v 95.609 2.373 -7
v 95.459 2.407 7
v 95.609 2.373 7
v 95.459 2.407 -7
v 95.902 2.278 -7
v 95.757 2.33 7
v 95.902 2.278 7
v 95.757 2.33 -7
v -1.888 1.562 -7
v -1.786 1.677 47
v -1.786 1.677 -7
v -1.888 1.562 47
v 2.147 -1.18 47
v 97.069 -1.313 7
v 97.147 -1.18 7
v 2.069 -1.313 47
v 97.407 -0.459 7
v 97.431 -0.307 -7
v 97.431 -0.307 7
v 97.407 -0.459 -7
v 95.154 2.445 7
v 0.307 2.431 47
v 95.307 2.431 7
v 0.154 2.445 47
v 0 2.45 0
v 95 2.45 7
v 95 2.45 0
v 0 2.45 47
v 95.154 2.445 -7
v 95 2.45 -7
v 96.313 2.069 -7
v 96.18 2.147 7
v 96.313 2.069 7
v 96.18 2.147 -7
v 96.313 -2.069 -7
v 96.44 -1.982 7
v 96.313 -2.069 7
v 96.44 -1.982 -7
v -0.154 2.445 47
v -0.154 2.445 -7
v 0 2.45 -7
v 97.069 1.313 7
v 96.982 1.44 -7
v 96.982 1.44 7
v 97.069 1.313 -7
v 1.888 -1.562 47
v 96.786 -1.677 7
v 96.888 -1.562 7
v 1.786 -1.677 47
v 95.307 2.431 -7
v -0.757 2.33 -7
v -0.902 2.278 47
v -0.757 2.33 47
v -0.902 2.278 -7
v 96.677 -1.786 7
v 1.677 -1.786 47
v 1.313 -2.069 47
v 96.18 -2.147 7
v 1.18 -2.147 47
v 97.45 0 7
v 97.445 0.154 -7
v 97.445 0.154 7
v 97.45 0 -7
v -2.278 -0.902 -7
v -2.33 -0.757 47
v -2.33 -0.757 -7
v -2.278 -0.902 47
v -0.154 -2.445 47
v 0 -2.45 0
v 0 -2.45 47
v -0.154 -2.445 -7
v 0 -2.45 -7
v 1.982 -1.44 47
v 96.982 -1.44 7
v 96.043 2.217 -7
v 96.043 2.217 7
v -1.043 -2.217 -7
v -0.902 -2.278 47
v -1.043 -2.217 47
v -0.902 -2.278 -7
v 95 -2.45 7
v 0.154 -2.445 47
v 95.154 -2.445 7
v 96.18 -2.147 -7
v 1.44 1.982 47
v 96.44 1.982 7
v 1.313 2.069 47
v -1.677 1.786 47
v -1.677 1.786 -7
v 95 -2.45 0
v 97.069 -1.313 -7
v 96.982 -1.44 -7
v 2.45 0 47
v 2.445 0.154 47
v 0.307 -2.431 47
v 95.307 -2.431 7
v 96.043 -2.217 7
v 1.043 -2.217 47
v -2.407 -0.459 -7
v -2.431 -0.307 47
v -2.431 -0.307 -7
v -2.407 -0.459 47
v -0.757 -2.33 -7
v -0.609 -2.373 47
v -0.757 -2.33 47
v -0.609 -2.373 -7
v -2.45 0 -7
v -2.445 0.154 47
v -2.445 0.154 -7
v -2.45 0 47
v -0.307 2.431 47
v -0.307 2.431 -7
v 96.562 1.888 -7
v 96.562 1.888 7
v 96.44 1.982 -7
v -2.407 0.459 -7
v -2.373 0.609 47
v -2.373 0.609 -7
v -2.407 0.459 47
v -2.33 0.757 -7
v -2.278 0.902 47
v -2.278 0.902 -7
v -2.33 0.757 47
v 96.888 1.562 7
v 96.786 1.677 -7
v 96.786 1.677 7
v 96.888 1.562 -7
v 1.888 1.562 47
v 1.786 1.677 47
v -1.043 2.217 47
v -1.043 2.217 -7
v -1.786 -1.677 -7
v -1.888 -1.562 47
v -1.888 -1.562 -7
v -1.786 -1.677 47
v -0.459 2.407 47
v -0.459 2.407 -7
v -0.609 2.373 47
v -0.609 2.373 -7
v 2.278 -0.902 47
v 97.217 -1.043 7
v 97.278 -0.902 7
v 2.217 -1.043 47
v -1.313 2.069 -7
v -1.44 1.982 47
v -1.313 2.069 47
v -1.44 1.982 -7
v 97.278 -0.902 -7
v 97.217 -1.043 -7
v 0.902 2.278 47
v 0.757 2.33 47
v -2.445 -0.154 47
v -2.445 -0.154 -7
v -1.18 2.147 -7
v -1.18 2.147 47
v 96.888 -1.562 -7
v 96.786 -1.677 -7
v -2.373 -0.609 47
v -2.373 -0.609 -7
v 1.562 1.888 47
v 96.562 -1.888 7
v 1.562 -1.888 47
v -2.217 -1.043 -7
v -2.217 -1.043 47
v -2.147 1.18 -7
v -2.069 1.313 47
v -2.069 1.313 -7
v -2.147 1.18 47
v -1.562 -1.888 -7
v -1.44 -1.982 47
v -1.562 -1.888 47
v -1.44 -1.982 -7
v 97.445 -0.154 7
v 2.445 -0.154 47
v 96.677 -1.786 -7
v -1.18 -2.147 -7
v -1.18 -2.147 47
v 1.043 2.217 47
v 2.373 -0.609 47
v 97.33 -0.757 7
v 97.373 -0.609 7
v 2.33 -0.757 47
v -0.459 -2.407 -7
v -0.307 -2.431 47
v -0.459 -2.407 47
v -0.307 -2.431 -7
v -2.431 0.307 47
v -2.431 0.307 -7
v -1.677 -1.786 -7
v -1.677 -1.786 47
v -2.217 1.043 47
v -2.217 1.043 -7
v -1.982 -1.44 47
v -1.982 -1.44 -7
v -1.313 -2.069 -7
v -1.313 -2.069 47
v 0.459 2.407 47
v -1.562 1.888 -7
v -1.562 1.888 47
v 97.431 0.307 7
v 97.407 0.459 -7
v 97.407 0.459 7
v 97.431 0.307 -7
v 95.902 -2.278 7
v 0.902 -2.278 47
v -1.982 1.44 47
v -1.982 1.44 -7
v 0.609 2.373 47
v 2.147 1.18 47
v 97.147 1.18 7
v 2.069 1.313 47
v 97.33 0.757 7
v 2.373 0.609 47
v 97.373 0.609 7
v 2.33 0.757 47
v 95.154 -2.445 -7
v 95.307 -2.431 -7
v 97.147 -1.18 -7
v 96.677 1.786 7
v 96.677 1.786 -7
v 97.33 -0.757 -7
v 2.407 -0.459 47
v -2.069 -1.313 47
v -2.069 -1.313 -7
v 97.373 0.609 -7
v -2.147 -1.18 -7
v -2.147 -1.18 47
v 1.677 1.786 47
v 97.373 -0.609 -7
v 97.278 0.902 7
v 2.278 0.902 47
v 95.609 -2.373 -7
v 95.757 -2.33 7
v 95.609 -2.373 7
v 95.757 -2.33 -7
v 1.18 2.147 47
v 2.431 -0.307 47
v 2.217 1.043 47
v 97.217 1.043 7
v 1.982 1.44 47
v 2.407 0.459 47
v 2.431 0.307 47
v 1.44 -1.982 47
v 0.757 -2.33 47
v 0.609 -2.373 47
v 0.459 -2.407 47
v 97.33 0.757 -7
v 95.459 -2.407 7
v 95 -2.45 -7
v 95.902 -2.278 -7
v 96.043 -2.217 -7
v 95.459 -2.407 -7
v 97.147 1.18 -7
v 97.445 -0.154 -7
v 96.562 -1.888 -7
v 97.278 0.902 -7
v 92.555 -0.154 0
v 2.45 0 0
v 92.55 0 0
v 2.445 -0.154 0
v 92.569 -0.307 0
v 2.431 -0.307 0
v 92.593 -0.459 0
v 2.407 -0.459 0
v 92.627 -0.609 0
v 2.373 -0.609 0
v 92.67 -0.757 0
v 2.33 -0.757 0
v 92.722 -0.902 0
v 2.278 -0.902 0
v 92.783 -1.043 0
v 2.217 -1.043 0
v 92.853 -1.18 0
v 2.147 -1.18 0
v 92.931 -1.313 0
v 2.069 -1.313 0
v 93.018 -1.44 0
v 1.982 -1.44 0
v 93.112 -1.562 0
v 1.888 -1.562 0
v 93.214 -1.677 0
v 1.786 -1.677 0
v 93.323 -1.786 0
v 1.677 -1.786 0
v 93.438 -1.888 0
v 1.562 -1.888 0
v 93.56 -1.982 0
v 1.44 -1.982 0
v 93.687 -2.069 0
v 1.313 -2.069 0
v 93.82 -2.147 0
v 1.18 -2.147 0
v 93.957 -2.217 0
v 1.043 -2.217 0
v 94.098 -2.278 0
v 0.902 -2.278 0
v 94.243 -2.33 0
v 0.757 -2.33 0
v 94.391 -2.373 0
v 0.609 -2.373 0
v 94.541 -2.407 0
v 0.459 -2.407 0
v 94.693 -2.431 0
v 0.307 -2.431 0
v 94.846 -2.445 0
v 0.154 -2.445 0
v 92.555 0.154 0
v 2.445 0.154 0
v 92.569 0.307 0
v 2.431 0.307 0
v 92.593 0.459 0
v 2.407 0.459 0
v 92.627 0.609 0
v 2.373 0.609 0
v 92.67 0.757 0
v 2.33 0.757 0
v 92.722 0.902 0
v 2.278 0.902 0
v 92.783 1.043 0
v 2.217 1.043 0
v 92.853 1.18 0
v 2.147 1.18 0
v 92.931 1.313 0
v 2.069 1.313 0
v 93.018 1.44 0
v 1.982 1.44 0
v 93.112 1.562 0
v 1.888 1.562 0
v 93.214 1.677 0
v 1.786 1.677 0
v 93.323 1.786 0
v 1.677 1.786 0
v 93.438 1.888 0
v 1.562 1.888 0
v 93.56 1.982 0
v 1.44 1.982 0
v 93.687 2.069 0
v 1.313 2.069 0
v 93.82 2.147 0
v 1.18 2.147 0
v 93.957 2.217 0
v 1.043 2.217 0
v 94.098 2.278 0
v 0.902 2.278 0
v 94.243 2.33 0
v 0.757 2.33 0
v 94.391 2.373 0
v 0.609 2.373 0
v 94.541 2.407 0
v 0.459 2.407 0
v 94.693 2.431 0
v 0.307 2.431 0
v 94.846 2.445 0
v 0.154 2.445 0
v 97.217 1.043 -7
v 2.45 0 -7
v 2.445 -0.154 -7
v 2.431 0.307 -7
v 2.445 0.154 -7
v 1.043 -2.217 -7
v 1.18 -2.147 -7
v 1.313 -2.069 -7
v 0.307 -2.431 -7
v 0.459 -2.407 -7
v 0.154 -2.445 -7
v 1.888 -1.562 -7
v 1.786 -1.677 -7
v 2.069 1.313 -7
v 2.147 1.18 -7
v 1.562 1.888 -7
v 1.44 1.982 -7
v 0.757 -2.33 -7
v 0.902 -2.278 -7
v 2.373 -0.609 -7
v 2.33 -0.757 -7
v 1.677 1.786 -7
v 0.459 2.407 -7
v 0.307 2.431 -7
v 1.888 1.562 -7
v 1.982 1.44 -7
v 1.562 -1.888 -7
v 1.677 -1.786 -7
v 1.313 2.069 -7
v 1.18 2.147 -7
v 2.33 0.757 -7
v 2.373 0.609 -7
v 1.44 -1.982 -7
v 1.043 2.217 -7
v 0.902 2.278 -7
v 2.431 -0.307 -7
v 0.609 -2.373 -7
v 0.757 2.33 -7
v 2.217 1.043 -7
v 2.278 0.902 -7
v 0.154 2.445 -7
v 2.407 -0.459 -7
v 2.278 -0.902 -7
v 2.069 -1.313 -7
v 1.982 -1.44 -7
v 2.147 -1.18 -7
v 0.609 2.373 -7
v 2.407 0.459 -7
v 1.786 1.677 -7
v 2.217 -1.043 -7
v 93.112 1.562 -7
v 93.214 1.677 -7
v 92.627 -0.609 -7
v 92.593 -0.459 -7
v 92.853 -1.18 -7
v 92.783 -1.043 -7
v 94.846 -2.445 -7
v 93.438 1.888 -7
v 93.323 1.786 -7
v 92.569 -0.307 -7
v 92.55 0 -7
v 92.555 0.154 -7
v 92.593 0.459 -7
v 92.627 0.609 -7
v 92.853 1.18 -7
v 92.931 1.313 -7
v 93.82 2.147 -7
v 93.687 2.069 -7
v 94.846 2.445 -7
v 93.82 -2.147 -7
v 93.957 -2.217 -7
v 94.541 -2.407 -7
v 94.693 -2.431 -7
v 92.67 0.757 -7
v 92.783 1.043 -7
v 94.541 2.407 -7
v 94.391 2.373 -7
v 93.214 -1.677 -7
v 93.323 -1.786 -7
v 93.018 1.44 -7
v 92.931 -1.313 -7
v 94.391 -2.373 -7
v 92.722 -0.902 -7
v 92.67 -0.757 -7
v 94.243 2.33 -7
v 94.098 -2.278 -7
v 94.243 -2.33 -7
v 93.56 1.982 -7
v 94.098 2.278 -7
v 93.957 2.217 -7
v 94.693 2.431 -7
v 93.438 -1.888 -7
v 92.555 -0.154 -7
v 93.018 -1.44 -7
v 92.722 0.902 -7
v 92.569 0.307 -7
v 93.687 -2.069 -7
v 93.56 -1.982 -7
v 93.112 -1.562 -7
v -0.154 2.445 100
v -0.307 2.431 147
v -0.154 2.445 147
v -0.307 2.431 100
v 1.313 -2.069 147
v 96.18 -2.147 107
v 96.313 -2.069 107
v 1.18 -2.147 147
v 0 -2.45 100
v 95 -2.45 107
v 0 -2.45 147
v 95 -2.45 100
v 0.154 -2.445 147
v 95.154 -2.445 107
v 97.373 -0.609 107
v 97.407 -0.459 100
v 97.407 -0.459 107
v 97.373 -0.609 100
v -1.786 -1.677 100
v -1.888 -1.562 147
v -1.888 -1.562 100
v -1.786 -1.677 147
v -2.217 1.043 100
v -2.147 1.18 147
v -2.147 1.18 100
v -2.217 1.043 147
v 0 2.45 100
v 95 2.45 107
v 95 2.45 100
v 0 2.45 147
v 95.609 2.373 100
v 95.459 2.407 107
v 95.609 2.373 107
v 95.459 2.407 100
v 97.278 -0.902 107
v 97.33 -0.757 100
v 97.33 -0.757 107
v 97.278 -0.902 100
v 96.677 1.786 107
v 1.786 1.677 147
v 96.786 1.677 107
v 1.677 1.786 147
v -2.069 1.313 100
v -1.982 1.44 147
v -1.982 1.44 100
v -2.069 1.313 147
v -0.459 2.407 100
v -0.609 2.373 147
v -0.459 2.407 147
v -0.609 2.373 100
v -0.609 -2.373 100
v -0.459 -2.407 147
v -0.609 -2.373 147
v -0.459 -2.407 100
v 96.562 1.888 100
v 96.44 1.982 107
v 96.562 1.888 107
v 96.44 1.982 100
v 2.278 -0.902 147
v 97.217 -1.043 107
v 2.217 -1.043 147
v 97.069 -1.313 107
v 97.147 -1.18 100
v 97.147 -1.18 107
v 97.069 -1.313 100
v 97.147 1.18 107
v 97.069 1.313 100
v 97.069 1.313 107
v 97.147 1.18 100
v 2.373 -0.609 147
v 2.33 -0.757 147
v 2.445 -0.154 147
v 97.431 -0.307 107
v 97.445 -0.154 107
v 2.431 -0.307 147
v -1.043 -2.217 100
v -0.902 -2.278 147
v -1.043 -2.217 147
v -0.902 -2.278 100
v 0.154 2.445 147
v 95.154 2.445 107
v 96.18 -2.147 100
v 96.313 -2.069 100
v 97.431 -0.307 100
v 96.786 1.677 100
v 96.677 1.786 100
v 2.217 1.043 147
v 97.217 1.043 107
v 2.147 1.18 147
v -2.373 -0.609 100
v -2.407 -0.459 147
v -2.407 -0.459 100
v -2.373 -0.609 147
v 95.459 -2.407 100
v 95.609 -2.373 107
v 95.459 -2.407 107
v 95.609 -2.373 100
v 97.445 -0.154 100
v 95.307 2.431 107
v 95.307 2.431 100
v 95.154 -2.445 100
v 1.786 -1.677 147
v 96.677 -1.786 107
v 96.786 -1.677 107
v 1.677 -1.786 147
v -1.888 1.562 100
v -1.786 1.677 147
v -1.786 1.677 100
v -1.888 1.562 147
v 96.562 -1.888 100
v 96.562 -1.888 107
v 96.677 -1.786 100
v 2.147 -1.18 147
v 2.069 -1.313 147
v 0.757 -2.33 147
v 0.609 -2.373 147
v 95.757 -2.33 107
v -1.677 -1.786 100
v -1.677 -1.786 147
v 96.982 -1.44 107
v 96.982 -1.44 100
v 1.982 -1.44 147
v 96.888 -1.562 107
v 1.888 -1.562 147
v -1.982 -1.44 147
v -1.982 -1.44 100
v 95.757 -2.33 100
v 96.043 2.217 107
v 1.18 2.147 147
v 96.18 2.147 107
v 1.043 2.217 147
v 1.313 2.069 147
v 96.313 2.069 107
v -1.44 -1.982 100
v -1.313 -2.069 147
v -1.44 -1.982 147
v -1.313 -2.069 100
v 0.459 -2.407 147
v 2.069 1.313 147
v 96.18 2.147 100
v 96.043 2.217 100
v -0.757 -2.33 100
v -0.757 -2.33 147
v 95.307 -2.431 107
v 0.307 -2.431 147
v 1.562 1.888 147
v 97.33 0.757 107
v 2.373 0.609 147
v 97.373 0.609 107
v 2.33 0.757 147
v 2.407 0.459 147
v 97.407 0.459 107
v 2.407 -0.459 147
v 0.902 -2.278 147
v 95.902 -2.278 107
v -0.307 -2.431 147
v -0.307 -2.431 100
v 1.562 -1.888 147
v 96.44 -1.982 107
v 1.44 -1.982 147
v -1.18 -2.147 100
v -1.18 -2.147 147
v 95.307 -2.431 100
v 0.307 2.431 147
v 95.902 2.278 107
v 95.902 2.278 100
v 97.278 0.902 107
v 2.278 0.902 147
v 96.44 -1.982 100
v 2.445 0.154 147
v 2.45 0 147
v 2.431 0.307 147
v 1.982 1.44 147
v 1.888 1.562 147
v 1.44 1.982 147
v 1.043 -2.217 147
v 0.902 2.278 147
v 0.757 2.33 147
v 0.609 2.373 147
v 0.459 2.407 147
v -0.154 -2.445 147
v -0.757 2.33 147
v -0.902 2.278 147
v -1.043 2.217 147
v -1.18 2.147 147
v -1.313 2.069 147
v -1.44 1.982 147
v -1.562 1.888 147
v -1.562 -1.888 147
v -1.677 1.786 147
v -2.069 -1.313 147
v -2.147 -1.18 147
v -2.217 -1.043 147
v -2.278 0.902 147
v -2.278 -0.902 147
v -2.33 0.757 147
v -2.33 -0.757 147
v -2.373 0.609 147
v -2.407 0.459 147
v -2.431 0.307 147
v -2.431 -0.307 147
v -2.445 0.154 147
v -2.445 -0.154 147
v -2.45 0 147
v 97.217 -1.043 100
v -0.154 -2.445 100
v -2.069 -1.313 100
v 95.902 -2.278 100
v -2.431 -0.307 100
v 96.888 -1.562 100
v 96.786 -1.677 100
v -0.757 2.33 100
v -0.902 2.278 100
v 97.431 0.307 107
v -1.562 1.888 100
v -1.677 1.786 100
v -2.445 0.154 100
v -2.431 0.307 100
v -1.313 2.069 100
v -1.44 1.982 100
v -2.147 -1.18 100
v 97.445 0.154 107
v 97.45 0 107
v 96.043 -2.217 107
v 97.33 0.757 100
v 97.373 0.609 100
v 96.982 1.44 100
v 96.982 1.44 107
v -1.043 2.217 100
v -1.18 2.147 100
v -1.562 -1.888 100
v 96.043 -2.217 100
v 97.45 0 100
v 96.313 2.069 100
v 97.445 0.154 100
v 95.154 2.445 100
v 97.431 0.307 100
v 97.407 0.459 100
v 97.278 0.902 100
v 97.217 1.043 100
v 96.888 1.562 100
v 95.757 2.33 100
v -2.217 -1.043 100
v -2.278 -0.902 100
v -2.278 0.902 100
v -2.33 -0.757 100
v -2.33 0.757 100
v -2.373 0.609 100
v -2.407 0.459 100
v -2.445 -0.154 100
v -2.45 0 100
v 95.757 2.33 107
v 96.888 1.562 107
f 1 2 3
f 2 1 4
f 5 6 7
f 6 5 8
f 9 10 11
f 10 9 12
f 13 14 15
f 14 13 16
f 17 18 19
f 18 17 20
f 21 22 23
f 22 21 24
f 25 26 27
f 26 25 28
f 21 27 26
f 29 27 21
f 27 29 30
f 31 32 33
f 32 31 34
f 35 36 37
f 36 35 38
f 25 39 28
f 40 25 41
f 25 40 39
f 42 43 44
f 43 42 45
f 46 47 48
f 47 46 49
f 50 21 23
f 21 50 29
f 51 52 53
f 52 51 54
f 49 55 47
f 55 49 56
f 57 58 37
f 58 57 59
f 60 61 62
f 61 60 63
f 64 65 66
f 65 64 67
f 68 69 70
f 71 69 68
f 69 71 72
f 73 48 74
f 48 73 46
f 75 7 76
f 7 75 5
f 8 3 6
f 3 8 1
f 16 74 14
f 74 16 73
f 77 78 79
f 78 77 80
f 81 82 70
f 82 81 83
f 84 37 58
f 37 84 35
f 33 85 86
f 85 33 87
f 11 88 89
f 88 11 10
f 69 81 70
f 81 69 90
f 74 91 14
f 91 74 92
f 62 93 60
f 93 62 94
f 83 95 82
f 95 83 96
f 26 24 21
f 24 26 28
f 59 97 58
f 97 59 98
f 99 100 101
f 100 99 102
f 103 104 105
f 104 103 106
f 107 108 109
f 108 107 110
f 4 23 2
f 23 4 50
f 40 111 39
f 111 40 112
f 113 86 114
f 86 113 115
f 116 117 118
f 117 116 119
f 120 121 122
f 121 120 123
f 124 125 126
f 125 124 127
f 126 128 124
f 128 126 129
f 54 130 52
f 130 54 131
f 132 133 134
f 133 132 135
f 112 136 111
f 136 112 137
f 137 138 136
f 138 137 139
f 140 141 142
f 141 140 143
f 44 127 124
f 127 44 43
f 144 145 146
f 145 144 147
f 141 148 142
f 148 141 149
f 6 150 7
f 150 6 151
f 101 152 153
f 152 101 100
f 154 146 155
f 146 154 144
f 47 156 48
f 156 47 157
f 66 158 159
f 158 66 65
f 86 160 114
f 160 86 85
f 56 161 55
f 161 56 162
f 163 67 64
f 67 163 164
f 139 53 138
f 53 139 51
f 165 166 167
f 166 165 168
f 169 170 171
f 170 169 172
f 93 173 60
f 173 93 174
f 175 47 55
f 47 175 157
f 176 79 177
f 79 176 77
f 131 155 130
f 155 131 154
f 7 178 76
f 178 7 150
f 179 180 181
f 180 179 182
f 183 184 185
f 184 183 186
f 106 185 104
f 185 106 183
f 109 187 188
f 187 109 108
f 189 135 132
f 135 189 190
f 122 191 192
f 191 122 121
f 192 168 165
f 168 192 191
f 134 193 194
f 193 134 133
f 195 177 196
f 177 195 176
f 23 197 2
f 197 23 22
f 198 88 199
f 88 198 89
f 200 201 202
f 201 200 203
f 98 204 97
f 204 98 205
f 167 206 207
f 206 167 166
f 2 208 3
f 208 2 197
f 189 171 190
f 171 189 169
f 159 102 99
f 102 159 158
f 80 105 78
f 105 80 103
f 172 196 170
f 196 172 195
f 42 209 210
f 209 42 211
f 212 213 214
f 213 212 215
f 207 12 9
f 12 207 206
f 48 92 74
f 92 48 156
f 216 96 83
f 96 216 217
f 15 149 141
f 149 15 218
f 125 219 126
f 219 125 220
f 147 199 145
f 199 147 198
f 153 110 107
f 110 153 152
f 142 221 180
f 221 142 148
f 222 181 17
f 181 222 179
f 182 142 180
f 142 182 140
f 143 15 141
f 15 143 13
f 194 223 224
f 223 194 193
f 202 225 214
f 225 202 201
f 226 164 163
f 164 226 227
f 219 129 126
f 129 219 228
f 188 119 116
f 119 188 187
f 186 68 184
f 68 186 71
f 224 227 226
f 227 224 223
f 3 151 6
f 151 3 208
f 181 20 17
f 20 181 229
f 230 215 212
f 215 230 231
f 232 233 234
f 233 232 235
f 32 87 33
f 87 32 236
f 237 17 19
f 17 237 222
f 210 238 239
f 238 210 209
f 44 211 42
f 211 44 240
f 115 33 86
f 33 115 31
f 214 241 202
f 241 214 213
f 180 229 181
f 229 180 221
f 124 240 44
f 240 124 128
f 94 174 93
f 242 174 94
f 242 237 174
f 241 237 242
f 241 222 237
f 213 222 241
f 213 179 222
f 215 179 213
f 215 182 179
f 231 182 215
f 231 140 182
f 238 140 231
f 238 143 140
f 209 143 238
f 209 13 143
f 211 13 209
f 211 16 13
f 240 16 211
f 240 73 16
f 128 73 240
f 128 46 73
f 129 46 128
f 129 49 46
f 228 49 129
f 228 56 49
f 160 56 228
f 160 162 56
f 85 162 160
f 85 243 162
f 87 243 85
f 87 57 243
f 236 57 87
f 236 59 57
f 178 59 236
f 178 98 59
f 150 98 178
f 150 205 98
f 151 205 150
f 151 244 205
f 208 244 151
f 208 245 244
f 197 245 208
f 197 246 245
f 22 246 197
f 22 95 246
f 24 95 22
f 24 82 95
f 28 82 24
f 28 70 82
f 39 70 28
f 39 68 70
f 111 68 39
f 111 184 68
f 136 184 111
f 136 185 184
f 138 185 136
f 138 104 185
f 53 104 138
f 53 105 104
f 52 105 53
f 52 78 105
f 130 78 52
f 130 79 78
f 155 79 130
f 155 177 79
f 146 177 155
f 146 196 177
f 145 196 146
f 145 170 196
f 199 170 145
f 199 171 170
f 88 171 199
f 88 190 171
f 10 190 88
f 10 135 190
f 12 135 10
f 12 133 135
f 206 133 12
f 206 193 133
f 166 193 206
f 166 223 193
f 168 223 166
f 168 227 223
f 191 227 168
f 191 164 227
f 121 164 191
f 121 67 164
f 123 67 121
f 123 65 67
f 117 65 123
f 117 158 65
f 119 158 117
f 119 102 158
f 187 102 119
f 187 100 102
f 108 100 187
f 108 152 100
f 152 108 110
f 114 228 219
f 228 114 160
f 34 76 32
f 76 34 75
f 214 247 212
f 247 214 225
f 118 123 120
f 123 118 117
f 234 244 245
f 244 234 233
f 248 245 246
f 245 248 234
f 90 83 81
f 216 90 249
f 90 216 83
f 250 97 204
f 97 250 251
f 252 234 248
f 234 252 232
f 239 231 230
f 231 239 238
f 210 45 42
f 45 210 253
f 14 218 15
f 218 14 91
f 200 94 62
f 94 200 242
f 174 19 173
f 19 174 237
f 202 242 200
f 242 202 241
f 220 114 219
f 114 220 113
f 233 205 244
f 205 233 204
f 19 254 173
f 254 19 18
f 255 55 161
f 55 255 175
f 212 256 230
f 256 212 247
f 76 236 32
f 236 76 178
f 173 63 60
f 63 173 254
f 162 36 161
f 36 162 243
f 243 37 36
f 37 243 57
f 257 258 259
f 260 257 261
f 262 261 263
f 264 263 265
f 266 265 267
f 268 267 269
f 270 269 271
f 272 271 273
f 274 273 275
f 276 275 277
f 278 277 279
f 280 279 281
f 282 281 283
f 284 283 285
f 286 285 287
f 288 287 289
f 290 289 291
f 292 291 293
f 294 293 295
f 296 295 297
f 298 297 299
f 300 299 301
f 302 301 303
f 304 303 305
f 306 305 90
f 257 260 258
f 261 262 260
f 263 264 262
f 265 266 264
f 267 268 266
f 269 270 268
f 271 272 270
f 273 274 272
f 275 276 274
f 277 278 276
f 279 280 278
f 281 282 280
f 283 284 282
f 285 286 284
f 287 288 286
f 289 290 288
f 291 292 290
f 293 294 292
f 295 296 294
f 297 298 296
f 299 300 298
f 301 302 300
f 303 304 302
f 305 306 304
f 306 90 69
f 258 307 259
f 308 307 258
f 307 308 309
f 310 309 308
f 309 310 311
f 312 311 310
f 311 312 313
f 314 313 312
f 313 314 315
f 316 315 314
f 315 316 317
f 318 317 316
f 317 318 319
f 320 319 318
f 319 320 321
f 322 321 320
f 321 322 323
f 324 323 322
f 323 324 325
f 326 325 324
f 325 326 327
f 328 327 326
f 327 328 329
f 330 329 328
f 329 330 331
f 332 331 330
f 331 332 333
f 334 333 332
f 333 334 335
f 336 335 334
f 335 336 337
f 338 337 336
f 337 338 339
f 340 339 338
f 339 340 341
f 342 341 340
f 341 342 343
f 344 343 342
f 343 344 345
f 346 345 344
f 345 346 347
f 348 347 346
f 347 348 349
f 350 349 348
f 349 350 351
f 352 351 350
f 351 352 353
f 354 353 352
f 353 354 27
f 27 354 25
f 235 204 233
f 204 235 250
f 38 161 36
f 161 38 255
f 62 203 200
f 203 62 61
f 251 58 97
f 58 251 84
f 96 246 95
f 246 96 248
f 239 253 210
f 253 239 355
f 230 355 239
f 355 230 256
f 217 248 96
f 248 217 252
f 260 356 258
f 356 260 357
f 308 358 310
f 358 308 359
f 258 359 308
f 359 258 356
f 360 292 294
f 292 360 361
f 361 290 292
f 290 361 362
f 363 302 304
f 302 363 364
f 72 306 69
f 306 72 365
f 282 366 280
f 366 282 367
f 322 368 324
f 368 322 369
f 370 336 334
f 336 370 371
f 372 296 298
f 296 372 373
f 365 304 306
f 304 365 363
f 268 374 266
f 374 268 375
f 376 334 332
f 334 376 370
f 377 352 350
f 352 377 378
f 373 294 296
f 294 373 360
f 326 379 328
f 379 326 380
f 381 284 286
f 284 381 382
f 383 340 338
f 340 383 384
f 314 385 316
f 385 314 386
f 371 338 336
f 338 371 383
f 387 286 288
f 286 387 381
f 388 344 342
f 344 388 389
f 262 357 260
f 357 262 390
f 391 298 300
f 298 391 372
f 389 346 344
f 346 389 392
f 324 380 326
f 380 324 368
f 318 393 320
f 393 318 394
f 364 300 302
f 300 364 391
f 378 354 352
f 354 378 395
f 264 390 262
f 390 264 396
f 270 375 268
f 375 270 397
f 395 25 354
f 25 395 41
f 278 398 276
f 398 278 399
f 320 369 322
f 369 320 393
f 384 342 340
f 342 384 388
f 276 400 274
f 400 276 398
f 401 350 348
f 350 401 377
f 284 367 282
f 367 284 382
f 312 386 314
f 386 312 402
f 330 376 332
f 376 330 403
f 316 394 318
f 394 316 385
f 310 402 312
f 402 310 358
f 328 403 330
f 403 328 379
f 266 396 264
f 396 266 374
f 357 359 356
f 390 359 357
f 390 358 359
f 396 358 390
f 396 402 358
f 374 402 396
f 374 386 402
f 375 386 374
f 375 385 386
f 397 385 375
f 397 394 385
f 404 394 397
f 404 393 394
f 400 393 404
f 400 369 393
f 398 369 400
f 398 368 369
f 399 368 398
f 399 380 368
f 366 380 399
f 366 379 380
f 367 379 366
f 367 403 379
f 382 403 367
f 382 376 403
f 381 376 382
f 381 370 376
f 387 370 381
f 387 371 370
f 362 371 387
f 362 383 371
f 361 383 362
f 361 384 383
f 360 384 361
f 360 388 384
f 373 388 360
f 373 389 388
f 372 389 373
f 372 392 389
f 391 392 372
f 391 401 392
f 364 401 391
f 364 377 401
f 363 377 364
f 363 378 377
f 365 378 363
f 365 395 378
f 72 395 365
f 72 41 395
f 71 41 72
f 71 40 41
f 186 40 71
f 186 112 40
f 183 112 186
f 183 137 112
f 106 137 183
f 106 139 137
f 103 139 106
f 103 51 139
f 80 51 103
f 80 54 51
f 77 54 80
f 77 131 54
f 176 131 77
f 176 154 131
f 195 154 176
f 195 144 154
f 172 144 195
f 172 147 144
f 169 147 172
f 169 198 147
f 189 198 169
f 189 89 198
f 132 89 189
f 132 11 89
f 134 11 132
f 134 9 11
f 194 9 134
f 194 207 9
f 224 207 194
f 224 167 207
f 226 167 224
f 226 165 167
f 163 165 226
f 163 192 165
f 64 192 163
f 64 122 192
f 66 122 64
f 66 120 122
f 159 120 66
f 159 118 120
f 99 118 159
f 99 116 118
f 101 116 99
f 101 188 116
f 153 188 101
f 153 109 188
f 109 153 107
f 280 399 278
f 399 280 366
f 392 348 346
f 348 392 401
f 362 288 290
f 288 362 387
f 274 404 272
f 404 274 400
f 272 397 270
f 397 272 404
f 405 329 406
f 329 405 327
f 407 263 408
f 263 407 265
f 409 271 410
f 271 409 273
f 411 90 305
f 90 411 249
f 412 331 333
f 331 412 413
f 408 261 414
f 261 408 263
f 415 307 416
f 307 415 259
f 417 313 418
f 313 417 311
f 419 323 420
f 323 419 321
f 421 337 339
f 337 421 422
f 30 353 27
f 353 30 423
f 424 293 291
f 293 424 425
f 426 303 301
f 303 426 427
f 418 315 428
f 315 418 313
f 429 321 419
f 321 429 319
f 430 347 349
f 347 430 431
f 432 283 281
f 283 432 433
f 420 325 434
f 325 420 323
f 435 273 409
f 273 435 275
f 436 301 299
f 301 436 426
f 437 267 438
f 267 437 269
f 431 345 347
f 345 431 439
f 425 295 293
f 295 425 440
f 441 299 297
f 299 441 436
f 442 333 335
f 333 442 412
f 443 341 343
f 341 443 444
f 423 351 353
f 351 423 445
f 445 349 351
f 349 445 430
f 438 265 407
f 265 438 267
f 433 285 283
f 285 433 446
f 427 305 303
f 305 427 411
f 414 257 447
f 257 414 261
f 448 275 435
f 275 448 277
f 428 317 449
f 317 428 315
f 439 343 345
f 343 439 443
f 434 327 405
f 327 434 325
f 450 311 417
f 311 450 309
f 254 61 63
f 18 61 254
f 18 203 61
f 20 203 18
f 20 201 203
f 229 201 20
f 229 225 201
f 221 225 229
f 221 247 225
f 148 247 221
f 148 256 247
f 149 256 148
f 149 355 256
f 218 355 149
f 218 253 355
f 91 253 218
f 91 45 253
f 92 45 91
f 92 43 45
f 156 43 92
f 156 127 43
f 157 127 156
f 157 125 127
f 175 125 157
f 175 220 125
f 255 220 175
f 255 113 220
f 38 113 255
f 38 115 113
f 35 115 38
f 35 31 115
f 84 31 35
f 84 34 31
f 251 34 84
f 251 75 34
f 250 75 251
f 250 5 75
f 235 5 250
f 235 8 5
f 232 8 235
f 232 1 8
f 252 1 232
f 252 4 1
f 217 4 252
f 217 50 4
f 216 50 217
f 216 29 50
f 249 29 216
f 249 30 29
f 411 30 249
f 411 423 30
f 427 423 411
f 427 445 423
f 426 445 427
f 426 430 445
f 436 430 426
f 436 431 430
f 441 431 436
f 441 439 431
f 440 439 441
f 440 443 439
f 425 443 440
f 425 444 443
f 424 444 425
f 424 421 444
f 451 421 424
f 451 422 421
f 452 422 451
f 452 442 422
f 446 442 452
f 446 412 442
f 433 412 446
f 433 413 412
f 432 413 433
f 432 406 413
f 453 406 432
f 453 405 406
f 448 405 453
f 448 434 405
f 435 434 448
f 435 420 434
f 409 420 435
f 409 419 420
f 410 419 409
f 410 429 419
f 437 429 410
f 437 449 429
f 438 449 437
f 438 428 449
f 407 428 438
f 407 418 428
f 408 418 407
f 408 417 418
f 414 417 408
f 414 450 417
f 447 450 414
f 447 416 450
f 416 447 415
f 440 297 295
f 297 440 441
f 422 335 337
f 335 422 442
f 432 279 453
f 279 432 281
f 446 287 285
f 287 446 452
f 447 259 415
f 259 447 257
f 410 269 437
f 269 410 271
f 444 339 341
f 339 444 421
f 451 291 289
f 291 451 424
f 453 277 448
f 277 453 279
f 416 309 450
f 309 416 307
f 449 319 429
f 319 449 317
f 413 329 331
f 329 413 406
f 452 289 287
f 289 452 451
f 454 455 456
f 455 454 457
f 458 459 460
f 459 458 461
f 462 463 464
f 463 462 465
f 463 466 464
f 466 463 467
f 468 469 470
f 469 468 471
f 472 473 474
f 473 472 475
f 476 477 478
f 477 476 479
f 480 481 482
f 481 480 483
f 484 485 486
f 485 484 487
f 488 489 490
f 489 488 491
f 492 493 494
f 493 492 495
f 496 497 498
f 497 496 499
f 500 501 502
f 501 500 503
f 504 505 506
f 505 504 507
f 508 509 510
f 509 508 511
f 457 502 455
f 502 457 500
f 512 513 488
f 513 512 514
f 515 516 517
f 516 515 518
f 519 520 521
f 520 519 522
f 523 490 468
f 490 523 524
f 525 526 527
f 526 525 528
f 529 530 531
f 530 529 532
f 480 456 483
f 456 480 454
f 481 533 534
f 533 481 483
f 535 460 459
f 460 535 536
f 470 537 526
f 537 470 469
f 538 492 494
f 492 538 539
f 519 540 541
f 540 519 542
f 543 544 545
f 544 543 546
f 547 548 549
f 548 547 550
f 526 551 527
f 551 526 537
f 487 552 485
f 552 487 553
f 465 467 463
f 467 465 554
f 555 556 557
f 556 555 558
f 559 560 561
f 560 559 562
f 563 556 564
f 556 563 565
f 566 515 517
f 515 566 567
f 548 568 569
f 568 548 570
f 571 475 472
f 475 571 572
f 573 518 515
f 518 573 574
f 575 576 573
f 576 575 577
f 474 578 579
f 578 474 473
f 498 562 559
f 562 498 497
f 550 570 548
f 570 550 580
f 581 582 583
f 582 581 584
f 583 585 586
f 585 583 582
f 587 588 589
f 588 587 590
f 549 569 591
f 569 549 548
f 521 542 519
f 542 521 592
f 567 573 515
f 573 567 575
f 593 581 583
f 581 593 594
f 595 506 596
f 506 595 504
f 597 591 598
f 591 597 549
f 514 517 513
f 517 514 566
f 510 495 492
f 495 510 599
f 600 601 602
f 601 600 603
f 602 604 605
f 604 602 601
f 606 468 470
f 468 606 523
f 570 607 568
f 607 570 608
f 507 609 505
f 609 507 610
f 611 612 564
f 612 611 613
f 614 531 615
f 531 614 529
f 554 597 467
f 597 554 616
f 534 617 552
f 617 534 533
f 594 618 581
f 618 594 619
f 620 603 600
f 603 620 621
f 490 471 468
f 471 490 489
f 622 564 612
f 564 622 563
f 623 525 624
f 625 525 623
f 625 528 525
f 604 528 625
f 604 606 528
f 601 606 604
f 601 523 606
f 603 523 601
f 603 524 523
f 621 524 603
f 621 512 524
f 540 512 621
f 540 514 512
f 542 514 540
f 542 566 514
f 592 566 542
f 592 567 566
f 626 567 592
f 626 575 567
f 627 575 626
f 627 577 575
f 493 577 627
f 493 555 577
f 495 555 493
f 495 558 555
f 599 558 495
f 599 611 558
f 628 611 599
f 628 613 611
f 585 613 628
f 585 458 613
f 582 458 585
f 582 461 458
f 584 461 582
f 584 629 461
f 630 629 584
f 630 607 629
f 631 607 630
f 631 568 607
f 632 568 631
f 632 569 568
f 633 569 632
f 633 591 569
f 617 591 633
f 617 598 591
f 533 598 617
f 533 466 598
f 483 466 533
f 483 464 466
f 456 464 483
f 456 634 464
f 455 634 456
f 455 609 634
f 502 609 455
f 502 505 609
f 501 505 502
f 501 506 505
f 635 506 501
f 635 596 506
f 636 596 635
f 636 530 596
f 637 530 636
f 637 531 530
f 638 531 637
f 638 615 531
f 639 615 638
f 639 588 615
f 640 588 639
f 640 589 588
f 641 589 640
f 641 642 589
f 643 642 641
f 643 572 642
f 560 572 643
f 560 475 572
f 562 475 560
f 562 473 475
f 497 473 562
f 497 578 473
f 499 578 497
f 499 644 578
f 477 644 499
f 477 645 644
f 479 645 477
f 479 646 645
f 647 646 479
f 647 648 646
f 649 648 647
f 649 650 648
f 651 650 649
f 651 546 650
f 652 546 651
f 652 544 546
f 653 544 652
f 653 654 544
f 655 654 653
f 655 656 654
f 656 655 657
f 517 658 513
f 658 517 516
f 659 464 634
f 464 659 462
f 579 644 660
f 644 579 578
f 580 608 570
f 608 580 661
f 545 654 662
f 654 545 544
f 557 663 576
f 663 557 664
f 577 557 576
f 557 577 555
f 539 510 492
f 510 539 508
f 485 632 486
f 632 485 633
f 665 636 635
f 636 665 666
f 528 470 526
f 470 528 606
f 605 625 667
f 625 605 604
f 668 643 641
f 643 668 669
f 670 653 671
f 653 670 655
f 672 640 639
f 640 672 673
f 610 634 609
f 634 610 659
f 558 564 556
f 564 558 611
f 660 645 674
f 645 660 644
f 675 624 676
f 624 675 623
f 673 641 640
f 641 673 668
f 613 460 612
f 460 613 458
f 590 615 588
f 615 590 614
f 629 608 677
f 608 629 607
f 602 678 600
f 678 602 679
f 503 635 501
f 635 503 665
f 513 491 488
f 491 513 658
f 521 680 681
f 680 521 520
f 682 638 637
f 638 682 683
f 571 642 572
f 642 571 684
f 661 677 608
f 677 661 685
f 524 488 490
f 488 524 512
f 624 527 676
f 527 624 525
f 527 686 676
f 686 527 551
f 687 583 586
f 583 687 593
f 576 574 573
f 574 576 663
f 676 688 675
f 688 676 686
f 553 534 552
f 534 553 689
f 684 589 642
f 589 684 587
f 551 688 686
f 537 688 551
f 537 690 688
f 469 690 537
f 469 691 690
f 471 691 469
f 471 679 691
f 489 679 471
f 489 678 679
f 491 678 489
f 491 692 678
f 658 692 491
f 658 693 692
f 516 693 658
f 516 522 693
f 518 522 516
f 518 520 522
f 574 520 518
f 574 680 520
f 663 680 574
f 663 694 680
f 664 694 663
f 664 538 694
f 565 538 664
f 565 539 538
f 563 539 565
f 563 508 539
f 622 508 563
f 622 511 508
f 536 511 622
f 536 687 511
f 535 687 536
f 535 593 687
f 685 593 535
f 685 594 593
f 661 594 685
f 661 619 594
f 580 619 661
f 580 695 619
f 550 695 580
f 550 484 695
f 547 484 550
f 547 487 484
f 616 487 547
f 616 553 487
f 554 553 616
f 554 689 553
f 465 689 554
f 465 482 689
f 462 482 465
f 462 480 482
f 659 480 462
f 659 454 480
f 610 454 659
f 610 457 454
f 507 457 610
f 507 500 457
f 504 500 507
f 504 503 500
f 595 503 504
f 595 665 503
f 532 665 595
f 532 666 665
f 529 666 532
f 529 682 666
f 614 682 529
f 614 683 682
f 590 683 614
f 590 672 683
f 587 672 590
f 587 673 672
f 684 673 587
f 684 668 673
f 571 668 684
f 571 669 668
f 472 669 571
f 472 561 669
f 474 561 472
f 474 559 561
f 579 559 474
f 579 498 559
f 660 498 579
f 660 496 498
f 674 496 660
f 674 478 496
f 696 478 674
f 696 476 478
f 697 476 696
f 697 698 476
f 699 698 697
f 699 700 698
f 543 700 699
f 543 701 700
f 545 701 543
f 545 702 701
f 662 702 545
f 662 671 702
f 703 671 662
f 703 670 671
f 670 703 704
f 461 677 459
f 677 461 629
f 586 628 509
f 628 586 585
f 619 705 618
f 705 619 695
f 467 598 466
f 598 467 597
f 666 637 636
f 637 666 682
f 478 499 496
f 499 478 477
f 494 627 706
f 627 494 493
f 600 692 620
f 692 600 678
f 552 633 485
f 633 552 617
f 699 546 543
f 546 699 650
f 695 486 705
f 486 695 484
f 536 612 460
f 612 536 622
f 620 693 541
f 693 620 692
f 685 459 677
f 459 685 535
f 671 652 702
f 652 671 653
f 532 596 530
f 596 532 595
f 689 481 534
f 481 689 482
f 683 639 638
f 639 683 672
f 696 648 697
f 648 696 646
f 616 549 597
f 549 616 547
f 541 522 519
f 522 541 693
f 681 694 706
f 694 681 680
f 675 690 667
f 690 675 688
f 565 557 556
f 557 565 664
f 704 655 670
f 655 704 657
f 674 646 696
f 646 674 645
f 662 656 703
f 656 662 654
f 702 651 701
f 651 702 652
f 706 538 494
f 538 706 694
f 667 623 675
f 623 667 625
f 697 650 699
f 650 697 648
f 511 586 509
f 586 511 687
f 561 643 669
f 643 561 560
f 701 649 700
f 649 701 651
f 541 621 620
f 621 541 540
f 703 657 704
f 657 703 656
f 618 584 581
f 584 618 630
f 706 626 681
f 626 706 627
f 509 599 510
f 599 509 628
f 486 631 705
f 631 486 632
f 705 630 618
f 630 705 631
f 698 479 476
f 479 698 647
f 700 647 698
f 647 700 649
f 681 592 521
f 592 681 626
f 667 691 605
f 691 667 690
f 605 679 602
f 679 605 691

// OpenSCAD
$fn = 100;

hook_distance = 95;
hook_diameter = 4.9;
hole_distance = 105;
hole_diameter = 4.1;

hull() {
cylinder(d = hook_diameter, h = 47);  
translate([hook_distance, 0, 0]) cylinder(d = hook_diameter, h = 7);  
}

translate([0, 0, -7]) cylinder(d = hook_diameter, h = 8); 
translate([hook_distance, 0, -7]) cylinder(d = hook_diameter, h = 8); 



translate([0,0,100])  hull() {
cylinder(d = hook_diameter, h = 47);  
translate([hook_distance, 0, 0]) cylinder(d = hook_diameter, h = 7);  
  translate([hook_distance, 0, 0]) cylinder(d = hook_diameter, h = 7);  
  translate([hook_distance, 0, 0]) cylinder(d = hook_diameter, h = 7);  
}
